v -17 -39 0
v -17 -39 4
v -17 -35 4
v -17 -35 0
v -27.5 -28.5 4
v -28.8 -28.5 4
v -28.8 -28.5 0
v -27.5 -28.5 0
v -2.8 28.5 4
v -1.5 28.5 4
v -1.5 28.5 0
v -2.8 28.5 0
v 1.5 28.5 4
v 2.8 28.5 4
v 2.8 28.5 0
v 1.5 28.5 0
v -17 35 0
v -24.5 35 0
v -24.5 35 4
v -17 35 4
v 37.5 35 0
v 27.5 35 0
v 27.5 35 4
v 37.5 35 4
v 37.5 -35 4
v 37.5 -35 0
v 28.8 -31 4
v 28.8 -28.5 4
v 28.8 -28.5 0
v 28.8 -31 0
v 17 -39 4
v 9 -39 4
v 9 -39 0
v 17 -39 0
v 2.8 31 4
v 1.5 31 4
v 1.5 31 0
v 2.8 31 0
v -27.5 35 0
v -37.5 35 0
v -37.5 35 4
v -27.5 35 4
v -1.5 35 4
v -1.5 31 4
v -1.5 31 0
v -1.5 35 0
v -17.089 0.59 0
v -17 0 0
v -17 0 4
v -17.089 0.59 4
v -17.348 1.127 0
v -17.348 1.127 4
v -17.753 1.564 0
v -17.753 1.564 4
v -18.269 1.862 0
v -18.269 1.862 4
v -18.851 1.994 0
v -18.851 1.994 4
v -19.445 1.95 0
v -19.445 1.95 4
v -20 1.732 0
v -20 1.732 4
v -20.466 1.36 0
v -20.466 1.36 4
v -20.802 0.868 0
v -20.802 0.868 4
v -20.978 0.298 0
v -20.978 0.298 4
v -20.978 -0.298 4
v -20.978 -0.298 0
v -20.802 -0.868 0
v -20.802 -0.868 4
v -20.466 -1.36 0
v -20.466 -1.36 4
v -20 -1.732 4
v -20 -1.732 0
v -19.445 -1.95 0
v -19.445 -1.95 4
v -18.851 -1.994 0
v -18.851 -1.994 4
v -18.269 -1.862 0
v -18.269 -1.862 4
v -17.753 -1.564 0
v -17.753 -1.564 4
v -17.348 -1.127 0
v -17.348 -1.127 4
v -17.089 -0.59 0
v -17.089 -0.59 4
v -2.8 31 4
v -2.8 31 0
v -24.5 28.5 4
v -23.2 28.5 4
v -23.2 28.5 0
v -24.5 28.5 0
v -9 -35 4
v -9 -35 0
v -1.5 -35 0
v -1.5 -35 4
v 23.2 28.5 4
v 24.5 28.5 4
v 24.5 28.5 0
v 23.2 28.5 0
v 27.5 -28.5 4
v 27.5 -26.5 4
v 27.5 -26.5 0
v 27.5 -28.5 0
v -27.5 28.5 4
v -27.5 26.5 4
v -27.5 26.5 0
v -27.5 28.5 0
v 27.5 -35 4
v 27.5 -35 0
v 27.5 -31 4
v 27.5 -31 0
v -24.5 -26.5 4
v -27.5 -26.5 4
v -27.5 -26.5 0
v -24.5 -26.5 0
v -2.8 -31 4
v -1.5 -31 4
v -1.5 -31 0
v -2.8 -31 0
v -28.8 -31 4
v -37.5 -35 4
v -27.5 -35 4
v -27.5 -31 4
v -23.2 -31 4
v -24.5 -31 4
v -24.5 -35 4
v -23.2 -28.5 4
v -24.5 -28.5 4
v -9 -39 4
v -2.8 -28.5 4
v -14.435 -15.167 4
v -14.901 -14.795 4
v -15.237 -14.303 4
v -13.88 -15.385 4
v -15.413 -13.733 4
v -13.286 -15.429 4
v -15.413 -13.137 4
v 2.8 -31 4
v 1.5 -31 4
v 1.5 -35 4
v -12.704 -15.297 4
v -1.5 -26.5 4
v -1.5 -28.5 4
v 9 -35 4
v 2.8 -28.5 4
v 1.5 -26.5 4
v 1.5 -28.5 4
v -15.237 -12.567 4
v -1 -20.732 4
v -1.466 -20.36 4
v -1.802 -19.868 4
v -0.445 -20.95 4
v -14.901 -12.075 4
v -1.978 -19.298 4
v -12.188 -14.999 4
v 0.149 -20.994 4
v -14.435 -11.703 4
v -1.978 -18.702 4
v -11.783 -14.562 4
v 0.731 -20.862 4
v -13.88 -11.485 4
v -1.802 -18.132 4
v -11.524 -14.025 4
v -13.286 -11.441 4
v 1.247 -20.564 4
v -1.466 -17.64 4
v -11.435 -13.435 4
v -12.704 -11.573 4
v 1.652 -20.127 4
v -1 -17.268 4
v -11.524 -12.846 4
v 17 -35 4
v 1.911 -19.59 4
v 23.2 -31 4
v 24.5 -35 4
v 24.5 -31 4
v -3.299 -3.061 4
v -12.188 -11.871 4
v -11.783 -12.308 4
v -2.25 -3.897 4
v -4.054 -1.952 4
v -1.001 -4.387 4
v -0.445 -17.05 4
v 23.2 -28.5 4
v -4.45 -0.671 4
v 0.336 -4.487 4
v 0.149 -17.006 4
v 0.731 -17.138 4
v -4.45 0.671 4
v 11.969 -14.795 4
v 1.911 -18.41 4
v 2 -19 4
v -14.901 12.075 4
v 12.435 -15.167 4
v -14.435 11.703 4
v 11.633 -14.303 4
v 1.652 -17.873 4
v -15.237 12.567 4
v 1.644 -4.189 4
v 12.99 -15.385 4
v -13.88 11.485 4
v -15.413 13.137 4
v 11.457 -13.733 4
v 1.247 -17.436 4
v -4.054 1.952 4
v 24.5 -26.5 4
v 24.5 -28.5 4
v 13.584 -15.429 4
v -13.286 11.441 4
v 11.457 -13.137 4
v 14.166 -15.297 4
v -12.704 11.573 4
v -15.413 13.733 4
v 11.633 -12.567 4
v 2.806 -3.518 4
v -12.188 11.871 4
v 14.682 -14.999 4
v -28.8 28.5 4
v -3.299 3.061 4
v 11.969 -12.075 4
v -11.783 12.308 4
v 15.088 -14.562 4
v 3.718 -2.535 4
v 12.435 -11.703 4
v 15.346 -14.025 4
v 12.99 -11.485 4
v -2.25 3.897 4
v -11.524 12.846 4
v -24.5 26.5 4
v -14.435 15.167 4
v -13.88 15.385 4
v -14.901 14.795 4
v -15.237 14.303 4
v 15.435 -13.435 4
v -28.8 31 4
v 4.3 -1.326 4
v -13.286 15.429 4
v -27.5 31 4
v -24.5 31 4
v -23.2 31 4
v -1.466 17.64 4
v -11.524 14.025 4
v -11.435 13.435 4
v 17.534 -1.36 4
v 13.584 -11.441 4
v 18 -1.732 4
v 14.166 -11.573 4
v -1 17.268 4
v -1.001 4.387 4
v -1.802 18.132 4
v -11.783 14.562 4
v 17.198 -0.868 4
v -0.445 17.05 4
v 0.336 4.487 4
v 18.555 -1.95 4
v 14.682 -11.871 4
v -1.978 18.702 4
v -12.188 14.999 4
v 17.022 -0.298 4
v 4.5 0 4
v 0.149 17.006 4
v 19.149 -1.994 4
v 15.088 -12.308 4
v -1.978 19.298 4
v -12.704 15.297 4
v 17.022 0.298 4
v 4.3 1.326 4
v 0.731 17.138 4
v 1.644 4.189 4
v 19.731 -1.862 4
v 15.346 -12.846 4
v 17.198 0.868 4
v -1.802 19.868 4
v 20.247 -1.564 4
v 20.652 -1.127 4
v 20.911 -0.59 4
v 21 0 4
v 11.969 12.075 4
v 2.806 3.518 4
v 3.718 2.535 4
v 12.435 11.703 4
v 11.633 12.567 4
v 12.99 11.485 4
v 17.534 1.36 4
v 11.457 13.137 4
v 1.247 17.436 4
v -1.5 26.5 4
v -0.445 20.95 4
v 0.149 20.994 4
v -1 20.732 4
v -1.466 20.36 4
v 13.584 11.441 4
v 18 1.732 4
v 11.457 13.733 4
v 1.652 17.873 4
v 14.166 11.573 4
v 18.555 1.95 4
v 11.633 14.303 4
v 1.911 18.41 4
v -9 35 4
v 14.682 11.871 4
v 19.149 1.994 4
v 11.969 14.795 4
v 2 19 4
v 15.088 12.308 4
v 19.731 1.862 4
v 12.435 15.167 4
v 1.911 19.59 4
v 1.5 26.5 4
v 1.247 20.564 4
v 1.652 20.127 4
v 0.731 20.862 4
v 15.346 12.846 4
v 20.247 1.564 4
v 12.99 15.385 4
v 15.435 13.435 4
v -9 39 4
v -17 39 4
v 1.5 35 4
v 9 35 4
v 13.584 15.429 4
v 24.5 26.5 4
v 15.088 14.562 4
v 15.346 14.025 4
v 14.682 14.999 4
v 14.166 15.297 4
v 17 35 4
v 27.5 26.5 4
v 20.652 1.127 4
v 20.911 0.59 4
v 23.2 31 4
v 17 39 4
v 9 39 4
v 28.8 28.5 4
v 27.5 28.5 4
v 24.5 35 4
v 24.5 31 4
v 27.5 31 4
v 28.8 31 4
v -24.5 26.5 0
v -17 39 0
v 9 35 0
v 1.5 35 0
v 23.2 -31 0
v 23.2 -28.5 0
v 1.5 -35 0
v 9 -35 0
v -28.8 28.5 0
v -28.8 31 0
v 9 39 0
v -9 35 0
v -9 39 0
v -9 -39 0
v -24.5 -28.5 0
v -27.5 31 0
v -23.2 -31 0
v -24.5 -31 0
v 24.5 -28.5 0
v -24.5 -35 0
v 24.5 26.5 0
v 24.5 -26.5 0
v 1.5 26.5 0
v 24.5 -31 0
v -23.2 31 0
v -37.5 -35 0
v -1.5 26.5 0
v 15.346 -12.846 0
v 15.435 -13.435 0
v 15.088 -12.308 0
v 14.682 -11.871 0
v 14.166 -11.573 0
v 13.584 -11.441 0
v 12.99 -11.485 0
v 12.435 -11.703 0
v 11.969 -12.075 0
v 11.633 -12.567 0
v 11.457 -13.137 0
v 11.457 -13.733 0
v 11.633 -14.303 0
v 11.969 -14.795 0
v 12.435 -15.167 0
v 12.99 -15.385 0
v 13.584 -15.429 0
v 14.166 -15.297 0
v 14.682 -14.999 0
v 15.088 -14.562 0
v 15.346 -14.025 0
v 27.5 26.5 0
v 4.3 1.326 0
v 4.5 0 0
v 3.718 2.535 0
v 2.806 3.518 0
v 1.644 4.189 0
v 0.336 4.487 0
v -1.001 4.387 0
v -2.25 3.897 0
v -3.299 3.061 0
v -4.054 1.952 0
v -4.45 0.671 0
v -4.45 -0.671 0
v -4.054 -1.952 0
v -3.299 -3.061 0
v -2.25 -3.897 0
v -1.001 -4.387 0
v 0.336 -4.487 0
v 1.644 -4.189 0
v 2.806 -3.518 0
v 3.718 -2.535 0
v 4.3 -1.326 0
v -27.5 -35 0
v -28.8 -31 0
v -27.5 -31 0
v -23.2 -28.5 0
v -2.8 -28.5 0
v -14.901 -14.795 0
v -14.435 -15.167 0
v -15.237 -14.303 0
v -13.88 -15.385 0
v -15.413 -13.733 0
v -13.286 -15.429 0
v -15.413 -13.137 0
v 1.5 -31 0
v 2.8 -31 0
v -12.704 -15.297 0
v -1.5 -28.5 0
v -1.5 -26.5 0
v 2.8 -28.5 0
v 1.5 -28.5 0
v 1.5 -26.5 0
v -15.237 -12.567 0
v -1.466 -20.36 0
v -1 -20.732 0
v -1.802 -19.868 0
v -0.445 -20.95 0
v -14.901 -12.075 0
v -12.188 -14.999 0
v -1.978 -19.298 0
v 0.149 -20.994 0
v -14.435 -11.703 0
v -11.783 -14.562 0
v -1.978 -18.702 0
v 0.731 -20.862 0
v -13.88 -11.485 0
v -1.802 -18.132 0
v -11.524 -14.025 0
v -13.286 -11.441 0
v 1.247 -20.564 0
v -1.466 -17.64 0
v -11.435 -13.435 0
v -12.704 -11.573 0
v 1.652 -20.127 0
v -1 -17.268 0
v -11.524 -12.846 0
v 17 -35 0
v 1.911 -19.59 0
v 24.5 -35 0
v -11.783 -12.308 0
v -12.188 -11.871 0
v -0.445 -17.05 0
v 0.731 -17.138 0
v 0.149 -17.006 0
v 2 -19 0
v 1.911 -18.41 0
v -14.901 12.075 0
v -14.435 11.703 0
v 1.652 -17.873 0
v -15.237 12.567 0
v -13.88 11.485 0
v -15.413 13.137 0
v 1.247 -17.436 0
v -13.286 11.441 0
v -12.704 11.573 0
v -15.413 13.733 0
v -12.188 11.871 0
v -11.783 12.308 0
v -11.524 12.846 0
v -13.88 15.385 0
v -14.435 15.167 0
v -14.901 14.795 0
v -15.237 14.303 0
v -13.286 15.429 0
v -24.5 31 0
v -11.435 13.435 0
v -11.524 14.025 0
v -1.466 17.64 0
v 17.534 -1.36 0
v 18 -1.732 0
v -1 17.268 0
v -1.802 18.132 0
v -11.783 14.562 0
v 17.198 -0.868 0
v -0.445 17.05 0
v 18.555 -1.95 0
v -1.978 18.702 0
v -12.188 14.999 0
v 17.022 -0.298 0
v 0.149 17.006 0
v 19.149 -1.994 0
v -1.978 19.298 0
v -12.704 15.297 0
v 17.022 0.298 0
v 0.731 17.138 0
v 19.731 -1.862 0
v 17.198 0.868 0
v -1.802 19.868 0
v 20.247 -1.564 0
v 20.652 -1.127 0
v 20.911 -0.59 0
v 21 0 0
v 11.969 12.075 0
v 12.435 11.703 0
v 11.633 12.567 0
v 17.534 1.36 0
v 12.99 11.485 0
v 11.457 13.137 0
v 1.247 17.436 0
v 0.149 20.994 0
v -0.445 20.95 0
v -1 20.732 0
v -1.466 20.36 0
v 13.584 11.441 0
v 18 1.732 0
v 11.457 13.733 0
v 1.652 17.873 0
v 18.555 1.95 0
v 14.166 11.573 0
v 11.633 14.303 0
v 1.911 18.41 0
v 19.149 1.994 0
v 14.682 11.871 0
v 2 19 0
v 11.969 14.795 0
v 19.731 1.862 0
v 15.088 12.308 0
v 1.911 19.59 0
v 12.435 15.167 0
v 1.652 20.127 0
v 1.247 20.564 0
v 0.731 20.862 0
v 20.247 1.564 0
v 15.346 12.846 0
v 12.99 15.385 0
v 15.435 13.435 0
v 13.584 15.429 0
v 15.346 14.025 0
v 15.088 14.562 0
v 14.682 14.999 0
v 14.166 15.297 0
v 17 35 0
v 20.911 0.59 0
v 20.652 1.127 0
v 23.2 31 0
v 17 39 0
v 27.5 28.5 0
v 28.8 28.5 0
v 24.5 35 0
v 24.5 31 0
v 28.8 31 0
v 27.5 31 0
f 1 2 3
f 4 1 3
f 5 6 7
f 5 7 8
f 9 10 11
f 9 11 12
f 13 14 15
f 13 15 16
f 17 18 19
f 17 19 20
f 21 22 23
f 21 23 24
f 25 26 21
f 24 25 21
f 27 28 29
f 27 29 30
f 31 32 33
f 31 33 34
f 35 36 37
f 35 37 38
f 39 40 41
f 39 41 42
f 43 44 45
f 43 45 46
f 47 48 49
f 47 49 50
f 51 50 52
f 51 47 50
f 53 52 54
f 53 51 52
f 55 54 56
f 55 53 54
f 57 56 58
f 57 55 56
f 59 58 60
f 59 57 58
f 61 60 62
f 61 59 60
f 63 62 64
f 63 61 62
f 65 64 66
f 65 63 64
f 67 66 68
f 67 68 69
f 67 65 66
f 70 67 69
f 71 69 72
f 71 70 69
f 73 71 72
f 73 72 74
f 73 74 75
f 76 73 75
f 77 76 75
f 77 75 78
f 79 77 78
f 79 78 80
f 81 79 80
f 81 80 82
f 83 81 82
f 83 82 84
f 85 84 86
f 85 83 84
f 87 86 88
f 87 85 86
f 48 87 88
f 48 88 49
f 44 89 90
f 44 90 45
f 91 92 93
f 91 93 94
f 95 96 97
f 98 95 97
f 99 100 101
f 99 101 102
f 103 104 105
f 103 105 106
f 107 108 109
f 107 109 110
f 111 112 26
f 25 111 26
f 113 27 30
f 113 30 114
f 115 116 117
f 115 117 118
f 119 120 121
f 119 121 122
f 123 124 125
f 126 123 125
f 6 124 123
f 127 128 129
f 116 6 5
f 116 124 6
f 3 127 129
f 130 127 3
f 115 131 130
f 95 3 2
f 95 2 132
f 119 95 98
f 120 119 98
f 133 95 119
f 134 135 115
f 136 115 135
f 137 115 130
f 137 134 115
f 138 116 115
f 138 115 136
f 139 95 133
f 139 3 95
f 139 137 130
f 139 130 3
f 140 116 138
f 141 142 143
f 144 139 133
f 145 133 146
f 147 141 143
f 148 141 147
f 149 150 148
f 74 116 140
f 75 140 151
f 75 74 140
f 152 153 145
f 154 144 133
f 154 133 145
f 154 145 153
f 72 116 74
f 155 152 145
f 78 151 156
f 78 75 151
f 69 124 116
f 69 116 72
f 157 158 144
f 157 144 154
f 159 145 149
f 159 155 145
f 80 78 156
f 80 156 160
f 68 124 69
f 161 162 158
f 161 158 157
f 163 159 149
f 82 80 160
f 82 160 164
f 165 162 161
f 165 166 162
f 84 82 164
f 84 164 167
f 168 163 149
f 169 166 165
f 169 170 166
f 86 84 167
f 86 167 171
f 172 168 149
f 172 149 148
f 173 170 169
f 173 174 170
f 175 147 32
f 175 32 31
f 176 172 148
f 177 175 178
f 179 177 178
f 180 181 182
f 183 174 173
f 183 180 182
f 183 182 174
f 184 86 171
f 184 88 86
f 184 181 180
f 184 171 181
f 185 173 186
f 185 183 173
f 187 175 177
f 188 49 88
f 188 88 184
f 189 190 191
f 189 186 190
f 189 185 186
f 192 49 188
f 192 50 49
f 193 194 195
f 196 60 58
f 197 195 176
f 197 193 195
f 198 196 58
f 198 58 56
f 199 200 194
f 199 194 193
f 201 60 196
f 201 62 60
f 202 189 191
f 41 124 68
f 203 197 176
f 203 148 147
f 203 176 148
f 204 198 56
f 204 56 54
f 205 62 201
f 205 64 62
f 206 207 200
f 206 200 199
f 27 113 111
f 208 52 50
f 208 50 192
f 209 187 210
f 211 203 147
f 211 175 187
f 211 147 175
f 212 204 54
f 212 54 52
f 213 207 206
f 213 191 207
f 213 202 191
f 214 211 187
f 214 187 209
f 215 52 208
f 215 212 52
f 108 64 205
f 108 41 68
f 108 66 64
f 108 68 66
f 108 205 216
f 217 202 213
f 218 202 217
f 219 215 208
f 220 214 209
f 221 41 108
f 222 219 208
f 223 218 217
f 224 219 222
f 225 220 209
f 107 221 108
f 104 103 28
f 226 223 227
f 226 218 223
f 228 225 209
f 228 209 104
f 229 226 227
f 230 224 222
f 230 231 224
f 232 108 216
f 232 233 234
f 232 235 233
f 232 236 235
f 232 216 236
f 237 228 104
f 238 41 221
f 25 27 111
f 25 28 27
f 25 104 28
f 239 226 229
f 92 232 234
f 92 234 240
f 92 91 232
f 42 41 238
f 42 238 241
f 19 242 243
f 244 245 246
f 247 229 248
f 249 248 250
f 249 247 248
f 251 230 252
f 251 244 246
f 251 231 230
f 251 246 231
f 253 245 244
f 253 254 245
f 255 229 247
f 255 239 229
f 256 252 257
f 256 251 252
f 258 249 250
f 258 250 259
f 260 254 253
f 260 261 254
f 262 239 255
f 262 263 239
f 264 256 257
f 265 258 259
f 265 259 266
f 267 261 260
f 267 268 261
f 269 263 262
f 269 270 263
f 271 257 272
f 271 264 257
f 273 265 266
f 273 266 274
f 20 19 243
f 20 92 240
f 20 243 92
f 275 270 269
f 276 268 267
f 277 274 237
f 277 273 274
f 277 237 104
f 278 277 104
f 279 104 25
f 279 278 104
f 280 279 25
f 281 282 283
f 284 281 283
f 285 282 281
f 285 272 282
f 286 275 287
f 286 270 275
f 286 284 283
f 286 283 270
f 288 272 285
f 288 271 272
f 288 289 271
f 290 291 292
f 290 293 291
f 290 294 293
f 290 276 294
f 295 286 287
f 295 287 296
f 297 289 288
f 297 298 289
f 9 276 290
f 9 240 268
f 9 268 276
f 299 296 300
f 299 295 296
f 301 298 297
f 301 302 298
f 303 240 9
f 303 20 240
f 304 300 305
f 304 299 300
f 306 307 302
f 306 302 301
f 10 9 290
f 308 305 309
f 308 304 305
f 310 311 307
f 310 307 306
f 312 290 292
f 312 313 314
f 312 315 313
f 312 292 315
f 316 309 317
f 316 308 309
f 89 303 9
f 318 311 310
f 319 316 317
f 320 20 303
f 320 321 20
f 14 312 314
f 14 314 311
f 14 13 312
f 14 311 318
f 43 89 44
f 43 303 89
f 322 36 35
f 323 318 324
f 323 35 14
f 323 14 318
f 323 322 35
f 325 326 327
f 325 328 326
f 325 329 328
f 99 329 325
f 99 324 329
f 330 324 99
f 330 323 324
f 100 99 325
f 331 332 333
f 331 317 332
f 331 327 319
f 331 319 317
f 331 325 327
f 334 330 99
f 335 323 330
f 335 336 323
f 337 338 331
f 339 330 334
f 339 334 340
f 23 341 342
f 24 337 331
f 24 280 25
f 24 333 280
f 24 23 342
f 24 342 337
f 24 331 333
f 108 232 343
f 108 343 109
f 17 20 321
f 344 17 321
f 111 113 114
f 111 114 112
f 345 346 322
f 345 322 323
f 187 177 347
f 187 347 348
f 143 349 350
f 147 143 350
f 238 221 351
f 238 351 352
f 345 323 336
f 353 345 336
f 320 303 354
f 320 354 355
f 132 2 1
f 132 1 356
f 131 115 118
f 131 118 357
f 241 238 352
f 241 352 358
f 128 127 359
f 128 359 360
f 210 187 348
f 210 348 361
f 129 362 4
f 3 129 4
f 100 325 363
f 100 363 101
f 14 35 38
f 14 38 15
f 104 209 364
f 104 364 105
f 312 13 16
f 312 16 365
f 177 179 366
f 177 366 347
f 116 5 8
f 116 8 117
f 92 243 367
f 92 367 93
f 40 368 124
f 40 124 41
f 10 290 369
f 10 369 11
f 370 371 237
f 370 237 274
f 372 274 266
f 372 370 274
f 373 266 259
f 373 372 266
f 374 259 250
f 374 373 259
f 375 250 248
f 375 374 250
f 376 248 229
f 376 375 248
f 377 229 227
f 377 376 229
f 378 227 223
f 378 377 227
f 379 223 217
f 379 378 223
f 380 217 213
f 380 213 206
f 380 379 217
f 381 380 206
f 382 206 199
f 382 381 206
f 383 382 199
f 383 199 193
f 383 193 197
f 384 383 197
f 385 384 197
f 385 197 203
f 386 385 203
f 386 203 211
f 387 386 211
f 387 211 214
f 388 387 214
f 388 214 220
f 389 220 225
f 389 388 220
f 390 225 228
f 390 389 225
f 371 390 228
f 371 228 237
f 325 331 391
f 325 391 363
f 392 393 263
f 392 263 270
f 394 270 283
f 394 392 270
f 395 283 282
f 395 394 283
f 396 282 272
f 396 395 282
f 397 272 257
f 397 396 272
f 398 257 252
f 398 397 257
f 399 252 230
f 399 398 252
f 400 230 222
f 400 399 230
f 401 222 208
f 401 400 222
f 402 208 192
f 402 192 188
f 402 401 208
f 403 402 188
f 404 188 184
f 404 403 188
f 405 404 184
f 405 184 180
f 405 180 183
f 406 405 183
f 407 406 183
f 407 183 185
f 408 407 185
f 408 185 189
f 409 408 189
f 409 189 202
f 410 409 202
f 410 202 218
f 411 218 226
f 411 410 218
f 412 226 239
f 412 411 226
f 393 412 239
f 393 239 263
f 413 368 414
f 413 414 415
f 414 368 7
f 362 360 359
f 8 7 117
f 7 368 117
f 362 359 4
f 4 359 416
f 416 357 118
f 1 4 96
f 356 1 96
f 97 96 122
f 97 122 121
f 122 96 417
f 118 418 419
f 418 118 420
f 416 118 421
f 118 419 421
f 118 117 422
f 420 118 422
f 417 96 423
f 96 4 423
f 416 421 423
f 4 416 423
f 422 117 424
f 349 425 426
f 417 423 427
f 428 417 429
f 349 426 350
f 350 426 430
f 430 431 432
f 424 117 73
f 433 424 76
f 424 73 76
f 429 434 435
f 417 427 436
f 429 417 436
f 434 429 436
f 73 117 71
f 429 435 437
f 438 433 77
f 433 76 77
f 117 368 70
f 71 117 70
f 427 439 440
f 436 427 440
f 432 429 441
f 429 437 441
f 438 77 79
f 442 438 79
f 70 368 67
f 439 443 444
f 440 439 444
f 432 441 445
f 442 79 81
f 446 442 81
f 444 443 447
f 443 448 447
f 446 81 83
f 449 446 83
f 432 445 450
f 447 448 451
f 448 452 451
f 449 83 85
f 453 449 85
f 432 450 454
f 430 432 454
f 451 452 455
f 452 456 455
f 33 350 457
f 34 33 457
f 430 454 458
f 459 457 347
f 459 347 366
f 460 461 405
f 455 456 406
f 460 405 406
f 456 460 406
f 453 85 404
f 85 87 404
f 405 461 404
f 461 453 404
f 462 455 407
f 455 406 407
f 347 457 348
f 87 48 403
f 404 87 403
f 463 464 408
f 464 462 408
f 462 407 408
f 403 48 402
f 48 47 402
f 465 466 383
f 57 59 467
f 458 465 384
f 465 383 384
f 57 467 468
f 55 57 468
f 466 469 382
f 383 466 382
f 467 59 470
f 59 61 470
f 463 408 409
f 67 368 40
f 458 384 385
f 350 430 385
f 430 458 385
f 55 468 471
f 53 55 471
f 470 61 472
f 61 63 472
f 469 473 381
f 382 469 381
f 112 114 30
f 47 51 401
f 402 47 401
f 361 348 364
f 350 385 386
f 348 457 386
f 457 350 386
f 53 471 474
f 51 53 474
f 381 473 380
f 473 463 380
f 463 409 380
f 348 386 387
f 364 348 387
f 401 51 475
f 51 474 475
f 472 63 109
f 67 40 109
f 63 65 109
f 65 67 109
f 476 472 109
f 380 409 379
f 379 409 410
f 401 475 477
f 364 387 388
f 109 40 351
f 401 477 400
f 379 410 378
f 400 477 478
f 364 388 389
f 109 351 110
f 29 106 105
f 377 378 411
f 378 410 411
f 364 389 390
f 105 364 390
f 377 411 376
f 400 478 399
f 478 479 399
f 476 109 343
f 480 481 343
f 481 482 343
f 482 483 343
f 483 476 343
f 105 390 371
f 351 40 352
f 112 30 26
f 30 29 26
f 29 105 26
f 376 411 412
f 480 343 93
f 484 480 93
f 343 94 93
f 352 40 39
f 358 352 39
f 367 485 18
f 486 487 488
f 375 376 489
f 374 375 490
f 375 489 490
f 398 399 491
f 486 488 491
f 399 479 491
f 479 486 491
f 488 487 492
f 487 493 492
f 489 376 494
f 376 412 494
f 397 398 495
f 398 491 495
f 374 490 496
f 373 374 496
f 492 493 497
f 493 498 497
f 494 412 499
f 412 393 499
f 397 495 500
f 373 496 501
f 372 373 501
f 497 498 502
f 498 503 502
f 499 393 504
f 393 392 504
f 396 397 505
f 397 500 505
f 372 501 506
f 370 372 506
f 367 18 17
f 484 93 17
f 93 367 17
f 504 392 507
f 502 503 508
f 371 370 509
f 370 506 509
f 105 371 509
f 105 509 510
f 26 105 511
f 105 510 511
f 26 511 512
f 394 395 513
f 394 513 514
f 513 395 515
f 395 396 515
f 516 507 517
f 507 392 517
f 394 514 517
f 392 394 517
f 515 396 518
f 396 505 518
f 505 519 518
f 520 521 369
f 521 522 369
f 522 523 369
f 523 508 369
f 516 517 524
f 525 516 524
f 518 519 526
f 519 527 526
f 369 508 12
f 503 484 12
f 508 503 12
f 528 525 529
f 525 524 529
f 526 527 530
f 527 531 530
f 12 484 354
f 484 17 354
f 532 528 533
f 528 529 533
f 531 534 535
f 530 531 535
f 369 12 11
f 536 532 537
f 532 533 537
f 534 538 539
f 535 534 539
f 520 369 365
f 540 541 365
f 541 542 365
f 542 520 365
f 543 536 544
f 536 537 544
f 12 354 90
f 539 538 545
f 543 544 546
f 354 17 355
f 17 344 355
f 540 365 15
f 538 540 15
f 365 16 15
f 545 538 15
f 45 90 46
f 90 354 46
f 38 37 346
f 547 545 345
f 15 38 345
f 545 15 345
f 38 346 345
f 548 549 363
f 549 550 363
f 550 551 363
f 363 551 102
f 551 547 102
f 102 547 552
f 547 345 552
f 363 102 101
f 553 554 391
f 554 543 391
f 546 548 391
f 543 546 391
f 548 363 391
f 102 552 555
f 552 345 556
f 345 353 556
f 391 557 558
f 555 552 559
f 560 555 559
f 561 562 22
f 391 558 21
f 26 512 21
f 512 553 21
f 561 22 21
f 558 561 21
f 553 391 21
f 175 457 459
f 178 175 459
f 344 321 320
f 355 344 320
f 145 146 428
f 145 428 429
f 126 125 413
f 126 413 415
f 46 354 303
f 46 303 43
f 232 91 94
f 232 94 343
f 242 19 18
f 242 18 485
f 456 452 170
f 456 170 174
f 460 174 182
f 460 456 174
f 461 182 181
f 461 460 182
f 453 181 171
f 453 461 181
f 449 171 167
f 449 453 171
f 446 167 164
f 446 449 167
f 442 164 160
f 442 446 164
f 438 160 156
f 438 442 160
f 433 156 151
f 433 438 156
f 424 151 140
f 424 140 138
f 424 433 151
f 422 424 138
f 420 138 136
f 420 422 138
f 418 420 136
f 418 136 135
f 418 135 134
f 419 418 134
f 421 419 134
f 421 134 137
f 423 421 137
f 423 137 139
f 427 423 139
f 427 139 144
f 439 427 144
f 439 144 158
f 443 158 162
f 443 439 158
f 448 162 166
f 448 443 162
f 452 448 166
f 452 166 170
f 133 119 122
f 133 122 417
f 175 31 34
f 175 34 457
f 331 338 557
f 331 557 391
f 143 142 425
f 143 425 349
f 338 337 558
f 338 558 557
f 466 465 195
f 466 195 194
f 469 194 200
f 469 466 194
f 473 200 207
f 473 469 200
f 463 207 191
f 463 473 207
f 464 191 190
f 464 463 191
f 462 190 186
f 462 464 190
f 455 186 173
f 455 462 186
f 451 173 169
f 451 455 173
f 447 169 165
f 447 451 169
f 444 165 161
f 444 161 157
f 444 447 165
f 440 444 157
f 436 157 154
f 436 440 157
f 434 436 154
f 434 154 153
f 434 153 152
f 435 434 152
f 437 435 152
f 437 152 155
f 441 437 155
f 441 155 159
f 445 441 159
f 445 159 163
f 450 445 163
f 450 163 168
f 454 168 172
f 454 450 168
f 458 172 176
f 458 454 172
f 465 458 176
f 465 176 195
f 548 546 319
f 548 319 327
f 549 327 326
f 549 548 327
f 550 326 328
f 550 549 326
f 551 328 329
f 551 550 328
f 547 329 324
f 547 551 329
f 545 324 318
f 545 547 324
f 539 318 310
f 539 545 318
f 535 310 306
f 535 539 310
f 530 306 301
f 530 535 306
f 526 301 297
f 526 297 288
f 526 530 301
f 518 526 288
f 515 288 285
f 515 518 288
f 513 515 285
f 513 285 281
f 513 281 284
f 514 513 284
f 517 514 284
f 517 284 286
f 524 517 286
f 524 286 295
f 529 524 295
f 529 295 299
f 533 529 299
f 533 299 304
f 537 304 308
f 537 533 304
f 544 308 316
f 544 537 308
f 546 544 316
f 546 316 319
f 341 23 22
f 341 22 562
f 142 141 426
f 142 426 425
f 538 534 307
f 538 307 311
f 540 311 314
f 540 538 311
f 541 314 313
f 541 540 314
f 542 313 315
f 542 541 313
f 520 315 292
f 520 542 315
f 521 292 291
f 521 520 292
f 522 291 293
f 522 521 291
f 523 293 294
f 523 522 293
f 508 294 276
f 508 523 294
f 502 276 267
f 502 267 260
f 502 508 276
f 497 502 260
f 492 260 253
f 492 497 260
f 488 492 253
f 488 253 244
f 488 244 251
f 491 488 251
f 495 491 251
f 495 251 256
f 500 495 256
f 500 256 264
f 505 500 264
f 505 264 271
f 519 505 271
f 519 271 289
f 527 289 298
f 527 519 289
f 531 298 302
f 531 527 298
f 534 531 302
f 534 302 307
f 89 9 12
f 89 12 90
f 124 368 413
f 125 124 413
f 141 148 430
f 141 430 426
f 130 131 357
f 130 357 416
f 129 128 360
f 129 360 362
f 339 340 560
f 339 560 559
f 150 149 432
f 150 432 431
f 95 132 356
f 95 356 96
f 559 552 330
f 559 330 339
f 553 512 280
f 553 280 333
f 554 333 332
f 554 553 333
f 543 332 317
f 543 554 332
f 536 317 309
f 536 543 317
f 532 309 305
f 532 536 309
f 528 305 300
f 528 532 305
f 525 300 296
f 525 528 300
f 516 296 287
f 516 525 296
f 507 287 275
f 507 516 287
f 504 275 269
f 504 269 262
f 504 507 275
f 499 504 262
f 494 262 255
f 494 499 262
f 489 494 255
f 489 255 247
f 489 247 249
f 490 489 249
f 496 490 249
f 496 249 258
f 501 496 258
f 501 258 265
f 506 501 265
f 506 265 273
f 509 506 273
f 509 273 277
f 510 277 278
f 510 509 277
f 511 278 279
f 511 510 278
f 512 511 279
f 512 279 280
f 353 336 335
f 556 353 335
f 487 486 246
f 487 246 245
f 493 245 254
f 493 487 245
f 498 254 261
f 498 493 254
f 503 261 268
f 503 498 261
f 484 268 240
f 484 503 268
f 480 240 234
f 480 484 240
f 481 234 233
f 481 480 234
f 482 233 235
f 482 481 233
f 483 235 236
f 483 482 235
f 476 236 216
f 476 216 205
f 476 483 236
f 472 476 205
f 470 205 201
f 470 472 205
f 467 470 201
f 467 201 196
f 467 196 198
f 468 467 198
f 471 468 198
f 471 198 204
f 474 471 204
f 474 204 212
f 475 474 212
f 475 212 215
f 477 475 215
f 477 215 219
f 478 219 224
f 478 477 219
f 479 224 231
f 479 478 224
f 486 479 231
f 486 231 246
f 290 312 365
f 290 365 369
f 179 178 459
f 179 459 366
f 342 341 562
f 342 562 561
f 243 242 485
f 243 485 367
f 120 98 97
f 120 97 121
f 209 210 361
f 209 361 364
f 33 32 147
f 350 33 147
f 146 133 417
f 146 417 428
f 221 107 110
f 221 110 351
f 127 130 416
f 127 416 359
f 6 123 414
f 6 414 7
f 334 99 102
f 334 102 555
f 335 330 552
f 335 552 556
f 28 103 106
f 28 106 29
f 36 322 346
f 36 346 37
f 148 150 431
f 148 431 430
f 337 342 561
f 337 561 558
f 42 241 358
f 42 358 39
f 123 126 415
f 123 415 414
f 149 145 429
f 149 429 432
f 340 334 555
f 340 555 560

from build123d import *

# Parameters (mm, degrees)
SKETCH_1_W          = 75
SKETCH_1_H          = 70
SKETCH_1_R          = 4.5
SKETCH_1_R_2        = 2
EXTRUDE_1_DEPTH     = 4
CUT_EXTRUDE_1_DEPTH = 4
SKETCH_3_W          = 8
SKETCH_3_H          = 4
EXTRUDE_2_DEPTH     = 4


with BuildPart() as part:
    # 草图1 → 凸台-拉伸1 (new body)
    with BuildSketch(Plane.XY):
        Rectangle(SKETCH_1_W, SKETCH_1_H)
        Circle(SKETCH_1_R, mode=Mode.SUBTRACT)
        with Locations((19, 0)):
            Circle(SKETCH_1_R_2, mode=Mode.SUBTRACT)
        with Locations((13.435028843, -13.435028843)):
            Circle(SKETCH_1_R_2, mode=Mode.SUBTRACT)
        with Locations((0, -19)):
            Circle(SKETCH_1_R_2, mode=Mode.SUBTRACT)
        with Locations((-13.435028843, -13.435028843)):
            Circle(SKETCH_1_R_2, mode=Mode.SUBTRACT)
        with Locations((-19, 0)):
            Circle(SKETCH_1_R_2, mode=Mode.SUBTRACT)
        with Locations((-13.435028843, 13.435028843)):
            Circle(SKETCH_1_R_2, mode=Mode.SUBTRACT)
        with Locations((0, 19)):
            Circle(SKETCH_1_R_2, mode=Mode.SUBTRACT)
        with Locations((13.435028843, 13.435028843)):
            Circle(SKETCH_1_R_2, mode=Mode.SUBTRACT)
    extrude(amount=EXTRUDE_1_DEPTH)

    # 草图2 → 切除-拉伸1 (cut)
    with BuildSketch(Plane.XY.offset(4)):
        Polygon((-1.5, 35), (1.5, 35), (1.5, 31), (2.8, 31), (2.8, 28.5), (1.5, 28.5), (1.5, 26.5), (-1.5, 26.5), (-1.5, 28.5), (-2.8, 28.5), (-2.8, 31), (-1.5, 31), align=None)
        Polygon((27.5, 35), (27.5, 31), (28.8, 31), (28.8, 28.5), (27.5, 28.5), (27.5, 26.5), (24.5, 26.5), (24.5, 28.5), (23.2, 28.5), (23.2, 31), (24.5, 31), (24.5, 35), align=None)
        Polygon((-27.5, 35), (-24.5, 35), (-24.5, 31), (-23.2, 31), (-23.2, 28.5), (-24.5, 28.5), (-24.5, 26.5), (-27.5, 26.5), (-27.5, 28.5), (-28.8, 28.5), (-28.8, 31), (-27.5, 31), align=None)
        Polygon((-27.5, -35), (-27.5, -31), (-28.8, -31), (-28.8, -28.5), (-27.5, -28.5), (-27.5, -26.5), (-24.5, -26.5), (-24.5, -28.5), (-23.2, -28.5), (-23.2, -31), (-24.5, -31), (-24.5, -35), align=None)
        Polygon((27.5, -35), (24.5, -35), (24.5, -31), (23.2, -31), (23.2, -28.5), (24.5, -28.5), (24.5, -26.5), (27.5, -26.5), (27.5, -28.5), (28.8, -28.5), (28.8, -31), (27.5, -31), align=None)
        Polygon((-1.5, -35), (-1.5, -31), (-2.8, -31), (-2.8, -28.5), (-1.5, -28.5), (-1.5, -26.5), (1.5, -26.5), (1.5, -28.5), (2.8, -28.5), (2.8, -31), (1.5, -31), (1.5, -35), align=None)
    extrude(amount=-CUT_EXTRUDE_1_DEPTH, mode=Mode.SUBTRACT)

    # 草图3 → 凸台-拉伸2 (add)
    with BuildSketch(Plane.XY.offset(4)):
        with Locations((-13, -37)):
            Rectangle(SKETCH_3_W, SKETCH_3_H)
        with Locations((13, -37)):
            Rectangle(SKETCH_3_W, SKETCH_3_H)
        with Locations((13, 37)):
            Rectangle(SKETCH_3_W, SKETCH_3_H)
        with Locations((-13, 37)):
            Rectangle(SKETCH_3_W, SKETCH_3_H)
    extrude(amount=-EXTRUDE_2_DEPTH)


solid = part.part
